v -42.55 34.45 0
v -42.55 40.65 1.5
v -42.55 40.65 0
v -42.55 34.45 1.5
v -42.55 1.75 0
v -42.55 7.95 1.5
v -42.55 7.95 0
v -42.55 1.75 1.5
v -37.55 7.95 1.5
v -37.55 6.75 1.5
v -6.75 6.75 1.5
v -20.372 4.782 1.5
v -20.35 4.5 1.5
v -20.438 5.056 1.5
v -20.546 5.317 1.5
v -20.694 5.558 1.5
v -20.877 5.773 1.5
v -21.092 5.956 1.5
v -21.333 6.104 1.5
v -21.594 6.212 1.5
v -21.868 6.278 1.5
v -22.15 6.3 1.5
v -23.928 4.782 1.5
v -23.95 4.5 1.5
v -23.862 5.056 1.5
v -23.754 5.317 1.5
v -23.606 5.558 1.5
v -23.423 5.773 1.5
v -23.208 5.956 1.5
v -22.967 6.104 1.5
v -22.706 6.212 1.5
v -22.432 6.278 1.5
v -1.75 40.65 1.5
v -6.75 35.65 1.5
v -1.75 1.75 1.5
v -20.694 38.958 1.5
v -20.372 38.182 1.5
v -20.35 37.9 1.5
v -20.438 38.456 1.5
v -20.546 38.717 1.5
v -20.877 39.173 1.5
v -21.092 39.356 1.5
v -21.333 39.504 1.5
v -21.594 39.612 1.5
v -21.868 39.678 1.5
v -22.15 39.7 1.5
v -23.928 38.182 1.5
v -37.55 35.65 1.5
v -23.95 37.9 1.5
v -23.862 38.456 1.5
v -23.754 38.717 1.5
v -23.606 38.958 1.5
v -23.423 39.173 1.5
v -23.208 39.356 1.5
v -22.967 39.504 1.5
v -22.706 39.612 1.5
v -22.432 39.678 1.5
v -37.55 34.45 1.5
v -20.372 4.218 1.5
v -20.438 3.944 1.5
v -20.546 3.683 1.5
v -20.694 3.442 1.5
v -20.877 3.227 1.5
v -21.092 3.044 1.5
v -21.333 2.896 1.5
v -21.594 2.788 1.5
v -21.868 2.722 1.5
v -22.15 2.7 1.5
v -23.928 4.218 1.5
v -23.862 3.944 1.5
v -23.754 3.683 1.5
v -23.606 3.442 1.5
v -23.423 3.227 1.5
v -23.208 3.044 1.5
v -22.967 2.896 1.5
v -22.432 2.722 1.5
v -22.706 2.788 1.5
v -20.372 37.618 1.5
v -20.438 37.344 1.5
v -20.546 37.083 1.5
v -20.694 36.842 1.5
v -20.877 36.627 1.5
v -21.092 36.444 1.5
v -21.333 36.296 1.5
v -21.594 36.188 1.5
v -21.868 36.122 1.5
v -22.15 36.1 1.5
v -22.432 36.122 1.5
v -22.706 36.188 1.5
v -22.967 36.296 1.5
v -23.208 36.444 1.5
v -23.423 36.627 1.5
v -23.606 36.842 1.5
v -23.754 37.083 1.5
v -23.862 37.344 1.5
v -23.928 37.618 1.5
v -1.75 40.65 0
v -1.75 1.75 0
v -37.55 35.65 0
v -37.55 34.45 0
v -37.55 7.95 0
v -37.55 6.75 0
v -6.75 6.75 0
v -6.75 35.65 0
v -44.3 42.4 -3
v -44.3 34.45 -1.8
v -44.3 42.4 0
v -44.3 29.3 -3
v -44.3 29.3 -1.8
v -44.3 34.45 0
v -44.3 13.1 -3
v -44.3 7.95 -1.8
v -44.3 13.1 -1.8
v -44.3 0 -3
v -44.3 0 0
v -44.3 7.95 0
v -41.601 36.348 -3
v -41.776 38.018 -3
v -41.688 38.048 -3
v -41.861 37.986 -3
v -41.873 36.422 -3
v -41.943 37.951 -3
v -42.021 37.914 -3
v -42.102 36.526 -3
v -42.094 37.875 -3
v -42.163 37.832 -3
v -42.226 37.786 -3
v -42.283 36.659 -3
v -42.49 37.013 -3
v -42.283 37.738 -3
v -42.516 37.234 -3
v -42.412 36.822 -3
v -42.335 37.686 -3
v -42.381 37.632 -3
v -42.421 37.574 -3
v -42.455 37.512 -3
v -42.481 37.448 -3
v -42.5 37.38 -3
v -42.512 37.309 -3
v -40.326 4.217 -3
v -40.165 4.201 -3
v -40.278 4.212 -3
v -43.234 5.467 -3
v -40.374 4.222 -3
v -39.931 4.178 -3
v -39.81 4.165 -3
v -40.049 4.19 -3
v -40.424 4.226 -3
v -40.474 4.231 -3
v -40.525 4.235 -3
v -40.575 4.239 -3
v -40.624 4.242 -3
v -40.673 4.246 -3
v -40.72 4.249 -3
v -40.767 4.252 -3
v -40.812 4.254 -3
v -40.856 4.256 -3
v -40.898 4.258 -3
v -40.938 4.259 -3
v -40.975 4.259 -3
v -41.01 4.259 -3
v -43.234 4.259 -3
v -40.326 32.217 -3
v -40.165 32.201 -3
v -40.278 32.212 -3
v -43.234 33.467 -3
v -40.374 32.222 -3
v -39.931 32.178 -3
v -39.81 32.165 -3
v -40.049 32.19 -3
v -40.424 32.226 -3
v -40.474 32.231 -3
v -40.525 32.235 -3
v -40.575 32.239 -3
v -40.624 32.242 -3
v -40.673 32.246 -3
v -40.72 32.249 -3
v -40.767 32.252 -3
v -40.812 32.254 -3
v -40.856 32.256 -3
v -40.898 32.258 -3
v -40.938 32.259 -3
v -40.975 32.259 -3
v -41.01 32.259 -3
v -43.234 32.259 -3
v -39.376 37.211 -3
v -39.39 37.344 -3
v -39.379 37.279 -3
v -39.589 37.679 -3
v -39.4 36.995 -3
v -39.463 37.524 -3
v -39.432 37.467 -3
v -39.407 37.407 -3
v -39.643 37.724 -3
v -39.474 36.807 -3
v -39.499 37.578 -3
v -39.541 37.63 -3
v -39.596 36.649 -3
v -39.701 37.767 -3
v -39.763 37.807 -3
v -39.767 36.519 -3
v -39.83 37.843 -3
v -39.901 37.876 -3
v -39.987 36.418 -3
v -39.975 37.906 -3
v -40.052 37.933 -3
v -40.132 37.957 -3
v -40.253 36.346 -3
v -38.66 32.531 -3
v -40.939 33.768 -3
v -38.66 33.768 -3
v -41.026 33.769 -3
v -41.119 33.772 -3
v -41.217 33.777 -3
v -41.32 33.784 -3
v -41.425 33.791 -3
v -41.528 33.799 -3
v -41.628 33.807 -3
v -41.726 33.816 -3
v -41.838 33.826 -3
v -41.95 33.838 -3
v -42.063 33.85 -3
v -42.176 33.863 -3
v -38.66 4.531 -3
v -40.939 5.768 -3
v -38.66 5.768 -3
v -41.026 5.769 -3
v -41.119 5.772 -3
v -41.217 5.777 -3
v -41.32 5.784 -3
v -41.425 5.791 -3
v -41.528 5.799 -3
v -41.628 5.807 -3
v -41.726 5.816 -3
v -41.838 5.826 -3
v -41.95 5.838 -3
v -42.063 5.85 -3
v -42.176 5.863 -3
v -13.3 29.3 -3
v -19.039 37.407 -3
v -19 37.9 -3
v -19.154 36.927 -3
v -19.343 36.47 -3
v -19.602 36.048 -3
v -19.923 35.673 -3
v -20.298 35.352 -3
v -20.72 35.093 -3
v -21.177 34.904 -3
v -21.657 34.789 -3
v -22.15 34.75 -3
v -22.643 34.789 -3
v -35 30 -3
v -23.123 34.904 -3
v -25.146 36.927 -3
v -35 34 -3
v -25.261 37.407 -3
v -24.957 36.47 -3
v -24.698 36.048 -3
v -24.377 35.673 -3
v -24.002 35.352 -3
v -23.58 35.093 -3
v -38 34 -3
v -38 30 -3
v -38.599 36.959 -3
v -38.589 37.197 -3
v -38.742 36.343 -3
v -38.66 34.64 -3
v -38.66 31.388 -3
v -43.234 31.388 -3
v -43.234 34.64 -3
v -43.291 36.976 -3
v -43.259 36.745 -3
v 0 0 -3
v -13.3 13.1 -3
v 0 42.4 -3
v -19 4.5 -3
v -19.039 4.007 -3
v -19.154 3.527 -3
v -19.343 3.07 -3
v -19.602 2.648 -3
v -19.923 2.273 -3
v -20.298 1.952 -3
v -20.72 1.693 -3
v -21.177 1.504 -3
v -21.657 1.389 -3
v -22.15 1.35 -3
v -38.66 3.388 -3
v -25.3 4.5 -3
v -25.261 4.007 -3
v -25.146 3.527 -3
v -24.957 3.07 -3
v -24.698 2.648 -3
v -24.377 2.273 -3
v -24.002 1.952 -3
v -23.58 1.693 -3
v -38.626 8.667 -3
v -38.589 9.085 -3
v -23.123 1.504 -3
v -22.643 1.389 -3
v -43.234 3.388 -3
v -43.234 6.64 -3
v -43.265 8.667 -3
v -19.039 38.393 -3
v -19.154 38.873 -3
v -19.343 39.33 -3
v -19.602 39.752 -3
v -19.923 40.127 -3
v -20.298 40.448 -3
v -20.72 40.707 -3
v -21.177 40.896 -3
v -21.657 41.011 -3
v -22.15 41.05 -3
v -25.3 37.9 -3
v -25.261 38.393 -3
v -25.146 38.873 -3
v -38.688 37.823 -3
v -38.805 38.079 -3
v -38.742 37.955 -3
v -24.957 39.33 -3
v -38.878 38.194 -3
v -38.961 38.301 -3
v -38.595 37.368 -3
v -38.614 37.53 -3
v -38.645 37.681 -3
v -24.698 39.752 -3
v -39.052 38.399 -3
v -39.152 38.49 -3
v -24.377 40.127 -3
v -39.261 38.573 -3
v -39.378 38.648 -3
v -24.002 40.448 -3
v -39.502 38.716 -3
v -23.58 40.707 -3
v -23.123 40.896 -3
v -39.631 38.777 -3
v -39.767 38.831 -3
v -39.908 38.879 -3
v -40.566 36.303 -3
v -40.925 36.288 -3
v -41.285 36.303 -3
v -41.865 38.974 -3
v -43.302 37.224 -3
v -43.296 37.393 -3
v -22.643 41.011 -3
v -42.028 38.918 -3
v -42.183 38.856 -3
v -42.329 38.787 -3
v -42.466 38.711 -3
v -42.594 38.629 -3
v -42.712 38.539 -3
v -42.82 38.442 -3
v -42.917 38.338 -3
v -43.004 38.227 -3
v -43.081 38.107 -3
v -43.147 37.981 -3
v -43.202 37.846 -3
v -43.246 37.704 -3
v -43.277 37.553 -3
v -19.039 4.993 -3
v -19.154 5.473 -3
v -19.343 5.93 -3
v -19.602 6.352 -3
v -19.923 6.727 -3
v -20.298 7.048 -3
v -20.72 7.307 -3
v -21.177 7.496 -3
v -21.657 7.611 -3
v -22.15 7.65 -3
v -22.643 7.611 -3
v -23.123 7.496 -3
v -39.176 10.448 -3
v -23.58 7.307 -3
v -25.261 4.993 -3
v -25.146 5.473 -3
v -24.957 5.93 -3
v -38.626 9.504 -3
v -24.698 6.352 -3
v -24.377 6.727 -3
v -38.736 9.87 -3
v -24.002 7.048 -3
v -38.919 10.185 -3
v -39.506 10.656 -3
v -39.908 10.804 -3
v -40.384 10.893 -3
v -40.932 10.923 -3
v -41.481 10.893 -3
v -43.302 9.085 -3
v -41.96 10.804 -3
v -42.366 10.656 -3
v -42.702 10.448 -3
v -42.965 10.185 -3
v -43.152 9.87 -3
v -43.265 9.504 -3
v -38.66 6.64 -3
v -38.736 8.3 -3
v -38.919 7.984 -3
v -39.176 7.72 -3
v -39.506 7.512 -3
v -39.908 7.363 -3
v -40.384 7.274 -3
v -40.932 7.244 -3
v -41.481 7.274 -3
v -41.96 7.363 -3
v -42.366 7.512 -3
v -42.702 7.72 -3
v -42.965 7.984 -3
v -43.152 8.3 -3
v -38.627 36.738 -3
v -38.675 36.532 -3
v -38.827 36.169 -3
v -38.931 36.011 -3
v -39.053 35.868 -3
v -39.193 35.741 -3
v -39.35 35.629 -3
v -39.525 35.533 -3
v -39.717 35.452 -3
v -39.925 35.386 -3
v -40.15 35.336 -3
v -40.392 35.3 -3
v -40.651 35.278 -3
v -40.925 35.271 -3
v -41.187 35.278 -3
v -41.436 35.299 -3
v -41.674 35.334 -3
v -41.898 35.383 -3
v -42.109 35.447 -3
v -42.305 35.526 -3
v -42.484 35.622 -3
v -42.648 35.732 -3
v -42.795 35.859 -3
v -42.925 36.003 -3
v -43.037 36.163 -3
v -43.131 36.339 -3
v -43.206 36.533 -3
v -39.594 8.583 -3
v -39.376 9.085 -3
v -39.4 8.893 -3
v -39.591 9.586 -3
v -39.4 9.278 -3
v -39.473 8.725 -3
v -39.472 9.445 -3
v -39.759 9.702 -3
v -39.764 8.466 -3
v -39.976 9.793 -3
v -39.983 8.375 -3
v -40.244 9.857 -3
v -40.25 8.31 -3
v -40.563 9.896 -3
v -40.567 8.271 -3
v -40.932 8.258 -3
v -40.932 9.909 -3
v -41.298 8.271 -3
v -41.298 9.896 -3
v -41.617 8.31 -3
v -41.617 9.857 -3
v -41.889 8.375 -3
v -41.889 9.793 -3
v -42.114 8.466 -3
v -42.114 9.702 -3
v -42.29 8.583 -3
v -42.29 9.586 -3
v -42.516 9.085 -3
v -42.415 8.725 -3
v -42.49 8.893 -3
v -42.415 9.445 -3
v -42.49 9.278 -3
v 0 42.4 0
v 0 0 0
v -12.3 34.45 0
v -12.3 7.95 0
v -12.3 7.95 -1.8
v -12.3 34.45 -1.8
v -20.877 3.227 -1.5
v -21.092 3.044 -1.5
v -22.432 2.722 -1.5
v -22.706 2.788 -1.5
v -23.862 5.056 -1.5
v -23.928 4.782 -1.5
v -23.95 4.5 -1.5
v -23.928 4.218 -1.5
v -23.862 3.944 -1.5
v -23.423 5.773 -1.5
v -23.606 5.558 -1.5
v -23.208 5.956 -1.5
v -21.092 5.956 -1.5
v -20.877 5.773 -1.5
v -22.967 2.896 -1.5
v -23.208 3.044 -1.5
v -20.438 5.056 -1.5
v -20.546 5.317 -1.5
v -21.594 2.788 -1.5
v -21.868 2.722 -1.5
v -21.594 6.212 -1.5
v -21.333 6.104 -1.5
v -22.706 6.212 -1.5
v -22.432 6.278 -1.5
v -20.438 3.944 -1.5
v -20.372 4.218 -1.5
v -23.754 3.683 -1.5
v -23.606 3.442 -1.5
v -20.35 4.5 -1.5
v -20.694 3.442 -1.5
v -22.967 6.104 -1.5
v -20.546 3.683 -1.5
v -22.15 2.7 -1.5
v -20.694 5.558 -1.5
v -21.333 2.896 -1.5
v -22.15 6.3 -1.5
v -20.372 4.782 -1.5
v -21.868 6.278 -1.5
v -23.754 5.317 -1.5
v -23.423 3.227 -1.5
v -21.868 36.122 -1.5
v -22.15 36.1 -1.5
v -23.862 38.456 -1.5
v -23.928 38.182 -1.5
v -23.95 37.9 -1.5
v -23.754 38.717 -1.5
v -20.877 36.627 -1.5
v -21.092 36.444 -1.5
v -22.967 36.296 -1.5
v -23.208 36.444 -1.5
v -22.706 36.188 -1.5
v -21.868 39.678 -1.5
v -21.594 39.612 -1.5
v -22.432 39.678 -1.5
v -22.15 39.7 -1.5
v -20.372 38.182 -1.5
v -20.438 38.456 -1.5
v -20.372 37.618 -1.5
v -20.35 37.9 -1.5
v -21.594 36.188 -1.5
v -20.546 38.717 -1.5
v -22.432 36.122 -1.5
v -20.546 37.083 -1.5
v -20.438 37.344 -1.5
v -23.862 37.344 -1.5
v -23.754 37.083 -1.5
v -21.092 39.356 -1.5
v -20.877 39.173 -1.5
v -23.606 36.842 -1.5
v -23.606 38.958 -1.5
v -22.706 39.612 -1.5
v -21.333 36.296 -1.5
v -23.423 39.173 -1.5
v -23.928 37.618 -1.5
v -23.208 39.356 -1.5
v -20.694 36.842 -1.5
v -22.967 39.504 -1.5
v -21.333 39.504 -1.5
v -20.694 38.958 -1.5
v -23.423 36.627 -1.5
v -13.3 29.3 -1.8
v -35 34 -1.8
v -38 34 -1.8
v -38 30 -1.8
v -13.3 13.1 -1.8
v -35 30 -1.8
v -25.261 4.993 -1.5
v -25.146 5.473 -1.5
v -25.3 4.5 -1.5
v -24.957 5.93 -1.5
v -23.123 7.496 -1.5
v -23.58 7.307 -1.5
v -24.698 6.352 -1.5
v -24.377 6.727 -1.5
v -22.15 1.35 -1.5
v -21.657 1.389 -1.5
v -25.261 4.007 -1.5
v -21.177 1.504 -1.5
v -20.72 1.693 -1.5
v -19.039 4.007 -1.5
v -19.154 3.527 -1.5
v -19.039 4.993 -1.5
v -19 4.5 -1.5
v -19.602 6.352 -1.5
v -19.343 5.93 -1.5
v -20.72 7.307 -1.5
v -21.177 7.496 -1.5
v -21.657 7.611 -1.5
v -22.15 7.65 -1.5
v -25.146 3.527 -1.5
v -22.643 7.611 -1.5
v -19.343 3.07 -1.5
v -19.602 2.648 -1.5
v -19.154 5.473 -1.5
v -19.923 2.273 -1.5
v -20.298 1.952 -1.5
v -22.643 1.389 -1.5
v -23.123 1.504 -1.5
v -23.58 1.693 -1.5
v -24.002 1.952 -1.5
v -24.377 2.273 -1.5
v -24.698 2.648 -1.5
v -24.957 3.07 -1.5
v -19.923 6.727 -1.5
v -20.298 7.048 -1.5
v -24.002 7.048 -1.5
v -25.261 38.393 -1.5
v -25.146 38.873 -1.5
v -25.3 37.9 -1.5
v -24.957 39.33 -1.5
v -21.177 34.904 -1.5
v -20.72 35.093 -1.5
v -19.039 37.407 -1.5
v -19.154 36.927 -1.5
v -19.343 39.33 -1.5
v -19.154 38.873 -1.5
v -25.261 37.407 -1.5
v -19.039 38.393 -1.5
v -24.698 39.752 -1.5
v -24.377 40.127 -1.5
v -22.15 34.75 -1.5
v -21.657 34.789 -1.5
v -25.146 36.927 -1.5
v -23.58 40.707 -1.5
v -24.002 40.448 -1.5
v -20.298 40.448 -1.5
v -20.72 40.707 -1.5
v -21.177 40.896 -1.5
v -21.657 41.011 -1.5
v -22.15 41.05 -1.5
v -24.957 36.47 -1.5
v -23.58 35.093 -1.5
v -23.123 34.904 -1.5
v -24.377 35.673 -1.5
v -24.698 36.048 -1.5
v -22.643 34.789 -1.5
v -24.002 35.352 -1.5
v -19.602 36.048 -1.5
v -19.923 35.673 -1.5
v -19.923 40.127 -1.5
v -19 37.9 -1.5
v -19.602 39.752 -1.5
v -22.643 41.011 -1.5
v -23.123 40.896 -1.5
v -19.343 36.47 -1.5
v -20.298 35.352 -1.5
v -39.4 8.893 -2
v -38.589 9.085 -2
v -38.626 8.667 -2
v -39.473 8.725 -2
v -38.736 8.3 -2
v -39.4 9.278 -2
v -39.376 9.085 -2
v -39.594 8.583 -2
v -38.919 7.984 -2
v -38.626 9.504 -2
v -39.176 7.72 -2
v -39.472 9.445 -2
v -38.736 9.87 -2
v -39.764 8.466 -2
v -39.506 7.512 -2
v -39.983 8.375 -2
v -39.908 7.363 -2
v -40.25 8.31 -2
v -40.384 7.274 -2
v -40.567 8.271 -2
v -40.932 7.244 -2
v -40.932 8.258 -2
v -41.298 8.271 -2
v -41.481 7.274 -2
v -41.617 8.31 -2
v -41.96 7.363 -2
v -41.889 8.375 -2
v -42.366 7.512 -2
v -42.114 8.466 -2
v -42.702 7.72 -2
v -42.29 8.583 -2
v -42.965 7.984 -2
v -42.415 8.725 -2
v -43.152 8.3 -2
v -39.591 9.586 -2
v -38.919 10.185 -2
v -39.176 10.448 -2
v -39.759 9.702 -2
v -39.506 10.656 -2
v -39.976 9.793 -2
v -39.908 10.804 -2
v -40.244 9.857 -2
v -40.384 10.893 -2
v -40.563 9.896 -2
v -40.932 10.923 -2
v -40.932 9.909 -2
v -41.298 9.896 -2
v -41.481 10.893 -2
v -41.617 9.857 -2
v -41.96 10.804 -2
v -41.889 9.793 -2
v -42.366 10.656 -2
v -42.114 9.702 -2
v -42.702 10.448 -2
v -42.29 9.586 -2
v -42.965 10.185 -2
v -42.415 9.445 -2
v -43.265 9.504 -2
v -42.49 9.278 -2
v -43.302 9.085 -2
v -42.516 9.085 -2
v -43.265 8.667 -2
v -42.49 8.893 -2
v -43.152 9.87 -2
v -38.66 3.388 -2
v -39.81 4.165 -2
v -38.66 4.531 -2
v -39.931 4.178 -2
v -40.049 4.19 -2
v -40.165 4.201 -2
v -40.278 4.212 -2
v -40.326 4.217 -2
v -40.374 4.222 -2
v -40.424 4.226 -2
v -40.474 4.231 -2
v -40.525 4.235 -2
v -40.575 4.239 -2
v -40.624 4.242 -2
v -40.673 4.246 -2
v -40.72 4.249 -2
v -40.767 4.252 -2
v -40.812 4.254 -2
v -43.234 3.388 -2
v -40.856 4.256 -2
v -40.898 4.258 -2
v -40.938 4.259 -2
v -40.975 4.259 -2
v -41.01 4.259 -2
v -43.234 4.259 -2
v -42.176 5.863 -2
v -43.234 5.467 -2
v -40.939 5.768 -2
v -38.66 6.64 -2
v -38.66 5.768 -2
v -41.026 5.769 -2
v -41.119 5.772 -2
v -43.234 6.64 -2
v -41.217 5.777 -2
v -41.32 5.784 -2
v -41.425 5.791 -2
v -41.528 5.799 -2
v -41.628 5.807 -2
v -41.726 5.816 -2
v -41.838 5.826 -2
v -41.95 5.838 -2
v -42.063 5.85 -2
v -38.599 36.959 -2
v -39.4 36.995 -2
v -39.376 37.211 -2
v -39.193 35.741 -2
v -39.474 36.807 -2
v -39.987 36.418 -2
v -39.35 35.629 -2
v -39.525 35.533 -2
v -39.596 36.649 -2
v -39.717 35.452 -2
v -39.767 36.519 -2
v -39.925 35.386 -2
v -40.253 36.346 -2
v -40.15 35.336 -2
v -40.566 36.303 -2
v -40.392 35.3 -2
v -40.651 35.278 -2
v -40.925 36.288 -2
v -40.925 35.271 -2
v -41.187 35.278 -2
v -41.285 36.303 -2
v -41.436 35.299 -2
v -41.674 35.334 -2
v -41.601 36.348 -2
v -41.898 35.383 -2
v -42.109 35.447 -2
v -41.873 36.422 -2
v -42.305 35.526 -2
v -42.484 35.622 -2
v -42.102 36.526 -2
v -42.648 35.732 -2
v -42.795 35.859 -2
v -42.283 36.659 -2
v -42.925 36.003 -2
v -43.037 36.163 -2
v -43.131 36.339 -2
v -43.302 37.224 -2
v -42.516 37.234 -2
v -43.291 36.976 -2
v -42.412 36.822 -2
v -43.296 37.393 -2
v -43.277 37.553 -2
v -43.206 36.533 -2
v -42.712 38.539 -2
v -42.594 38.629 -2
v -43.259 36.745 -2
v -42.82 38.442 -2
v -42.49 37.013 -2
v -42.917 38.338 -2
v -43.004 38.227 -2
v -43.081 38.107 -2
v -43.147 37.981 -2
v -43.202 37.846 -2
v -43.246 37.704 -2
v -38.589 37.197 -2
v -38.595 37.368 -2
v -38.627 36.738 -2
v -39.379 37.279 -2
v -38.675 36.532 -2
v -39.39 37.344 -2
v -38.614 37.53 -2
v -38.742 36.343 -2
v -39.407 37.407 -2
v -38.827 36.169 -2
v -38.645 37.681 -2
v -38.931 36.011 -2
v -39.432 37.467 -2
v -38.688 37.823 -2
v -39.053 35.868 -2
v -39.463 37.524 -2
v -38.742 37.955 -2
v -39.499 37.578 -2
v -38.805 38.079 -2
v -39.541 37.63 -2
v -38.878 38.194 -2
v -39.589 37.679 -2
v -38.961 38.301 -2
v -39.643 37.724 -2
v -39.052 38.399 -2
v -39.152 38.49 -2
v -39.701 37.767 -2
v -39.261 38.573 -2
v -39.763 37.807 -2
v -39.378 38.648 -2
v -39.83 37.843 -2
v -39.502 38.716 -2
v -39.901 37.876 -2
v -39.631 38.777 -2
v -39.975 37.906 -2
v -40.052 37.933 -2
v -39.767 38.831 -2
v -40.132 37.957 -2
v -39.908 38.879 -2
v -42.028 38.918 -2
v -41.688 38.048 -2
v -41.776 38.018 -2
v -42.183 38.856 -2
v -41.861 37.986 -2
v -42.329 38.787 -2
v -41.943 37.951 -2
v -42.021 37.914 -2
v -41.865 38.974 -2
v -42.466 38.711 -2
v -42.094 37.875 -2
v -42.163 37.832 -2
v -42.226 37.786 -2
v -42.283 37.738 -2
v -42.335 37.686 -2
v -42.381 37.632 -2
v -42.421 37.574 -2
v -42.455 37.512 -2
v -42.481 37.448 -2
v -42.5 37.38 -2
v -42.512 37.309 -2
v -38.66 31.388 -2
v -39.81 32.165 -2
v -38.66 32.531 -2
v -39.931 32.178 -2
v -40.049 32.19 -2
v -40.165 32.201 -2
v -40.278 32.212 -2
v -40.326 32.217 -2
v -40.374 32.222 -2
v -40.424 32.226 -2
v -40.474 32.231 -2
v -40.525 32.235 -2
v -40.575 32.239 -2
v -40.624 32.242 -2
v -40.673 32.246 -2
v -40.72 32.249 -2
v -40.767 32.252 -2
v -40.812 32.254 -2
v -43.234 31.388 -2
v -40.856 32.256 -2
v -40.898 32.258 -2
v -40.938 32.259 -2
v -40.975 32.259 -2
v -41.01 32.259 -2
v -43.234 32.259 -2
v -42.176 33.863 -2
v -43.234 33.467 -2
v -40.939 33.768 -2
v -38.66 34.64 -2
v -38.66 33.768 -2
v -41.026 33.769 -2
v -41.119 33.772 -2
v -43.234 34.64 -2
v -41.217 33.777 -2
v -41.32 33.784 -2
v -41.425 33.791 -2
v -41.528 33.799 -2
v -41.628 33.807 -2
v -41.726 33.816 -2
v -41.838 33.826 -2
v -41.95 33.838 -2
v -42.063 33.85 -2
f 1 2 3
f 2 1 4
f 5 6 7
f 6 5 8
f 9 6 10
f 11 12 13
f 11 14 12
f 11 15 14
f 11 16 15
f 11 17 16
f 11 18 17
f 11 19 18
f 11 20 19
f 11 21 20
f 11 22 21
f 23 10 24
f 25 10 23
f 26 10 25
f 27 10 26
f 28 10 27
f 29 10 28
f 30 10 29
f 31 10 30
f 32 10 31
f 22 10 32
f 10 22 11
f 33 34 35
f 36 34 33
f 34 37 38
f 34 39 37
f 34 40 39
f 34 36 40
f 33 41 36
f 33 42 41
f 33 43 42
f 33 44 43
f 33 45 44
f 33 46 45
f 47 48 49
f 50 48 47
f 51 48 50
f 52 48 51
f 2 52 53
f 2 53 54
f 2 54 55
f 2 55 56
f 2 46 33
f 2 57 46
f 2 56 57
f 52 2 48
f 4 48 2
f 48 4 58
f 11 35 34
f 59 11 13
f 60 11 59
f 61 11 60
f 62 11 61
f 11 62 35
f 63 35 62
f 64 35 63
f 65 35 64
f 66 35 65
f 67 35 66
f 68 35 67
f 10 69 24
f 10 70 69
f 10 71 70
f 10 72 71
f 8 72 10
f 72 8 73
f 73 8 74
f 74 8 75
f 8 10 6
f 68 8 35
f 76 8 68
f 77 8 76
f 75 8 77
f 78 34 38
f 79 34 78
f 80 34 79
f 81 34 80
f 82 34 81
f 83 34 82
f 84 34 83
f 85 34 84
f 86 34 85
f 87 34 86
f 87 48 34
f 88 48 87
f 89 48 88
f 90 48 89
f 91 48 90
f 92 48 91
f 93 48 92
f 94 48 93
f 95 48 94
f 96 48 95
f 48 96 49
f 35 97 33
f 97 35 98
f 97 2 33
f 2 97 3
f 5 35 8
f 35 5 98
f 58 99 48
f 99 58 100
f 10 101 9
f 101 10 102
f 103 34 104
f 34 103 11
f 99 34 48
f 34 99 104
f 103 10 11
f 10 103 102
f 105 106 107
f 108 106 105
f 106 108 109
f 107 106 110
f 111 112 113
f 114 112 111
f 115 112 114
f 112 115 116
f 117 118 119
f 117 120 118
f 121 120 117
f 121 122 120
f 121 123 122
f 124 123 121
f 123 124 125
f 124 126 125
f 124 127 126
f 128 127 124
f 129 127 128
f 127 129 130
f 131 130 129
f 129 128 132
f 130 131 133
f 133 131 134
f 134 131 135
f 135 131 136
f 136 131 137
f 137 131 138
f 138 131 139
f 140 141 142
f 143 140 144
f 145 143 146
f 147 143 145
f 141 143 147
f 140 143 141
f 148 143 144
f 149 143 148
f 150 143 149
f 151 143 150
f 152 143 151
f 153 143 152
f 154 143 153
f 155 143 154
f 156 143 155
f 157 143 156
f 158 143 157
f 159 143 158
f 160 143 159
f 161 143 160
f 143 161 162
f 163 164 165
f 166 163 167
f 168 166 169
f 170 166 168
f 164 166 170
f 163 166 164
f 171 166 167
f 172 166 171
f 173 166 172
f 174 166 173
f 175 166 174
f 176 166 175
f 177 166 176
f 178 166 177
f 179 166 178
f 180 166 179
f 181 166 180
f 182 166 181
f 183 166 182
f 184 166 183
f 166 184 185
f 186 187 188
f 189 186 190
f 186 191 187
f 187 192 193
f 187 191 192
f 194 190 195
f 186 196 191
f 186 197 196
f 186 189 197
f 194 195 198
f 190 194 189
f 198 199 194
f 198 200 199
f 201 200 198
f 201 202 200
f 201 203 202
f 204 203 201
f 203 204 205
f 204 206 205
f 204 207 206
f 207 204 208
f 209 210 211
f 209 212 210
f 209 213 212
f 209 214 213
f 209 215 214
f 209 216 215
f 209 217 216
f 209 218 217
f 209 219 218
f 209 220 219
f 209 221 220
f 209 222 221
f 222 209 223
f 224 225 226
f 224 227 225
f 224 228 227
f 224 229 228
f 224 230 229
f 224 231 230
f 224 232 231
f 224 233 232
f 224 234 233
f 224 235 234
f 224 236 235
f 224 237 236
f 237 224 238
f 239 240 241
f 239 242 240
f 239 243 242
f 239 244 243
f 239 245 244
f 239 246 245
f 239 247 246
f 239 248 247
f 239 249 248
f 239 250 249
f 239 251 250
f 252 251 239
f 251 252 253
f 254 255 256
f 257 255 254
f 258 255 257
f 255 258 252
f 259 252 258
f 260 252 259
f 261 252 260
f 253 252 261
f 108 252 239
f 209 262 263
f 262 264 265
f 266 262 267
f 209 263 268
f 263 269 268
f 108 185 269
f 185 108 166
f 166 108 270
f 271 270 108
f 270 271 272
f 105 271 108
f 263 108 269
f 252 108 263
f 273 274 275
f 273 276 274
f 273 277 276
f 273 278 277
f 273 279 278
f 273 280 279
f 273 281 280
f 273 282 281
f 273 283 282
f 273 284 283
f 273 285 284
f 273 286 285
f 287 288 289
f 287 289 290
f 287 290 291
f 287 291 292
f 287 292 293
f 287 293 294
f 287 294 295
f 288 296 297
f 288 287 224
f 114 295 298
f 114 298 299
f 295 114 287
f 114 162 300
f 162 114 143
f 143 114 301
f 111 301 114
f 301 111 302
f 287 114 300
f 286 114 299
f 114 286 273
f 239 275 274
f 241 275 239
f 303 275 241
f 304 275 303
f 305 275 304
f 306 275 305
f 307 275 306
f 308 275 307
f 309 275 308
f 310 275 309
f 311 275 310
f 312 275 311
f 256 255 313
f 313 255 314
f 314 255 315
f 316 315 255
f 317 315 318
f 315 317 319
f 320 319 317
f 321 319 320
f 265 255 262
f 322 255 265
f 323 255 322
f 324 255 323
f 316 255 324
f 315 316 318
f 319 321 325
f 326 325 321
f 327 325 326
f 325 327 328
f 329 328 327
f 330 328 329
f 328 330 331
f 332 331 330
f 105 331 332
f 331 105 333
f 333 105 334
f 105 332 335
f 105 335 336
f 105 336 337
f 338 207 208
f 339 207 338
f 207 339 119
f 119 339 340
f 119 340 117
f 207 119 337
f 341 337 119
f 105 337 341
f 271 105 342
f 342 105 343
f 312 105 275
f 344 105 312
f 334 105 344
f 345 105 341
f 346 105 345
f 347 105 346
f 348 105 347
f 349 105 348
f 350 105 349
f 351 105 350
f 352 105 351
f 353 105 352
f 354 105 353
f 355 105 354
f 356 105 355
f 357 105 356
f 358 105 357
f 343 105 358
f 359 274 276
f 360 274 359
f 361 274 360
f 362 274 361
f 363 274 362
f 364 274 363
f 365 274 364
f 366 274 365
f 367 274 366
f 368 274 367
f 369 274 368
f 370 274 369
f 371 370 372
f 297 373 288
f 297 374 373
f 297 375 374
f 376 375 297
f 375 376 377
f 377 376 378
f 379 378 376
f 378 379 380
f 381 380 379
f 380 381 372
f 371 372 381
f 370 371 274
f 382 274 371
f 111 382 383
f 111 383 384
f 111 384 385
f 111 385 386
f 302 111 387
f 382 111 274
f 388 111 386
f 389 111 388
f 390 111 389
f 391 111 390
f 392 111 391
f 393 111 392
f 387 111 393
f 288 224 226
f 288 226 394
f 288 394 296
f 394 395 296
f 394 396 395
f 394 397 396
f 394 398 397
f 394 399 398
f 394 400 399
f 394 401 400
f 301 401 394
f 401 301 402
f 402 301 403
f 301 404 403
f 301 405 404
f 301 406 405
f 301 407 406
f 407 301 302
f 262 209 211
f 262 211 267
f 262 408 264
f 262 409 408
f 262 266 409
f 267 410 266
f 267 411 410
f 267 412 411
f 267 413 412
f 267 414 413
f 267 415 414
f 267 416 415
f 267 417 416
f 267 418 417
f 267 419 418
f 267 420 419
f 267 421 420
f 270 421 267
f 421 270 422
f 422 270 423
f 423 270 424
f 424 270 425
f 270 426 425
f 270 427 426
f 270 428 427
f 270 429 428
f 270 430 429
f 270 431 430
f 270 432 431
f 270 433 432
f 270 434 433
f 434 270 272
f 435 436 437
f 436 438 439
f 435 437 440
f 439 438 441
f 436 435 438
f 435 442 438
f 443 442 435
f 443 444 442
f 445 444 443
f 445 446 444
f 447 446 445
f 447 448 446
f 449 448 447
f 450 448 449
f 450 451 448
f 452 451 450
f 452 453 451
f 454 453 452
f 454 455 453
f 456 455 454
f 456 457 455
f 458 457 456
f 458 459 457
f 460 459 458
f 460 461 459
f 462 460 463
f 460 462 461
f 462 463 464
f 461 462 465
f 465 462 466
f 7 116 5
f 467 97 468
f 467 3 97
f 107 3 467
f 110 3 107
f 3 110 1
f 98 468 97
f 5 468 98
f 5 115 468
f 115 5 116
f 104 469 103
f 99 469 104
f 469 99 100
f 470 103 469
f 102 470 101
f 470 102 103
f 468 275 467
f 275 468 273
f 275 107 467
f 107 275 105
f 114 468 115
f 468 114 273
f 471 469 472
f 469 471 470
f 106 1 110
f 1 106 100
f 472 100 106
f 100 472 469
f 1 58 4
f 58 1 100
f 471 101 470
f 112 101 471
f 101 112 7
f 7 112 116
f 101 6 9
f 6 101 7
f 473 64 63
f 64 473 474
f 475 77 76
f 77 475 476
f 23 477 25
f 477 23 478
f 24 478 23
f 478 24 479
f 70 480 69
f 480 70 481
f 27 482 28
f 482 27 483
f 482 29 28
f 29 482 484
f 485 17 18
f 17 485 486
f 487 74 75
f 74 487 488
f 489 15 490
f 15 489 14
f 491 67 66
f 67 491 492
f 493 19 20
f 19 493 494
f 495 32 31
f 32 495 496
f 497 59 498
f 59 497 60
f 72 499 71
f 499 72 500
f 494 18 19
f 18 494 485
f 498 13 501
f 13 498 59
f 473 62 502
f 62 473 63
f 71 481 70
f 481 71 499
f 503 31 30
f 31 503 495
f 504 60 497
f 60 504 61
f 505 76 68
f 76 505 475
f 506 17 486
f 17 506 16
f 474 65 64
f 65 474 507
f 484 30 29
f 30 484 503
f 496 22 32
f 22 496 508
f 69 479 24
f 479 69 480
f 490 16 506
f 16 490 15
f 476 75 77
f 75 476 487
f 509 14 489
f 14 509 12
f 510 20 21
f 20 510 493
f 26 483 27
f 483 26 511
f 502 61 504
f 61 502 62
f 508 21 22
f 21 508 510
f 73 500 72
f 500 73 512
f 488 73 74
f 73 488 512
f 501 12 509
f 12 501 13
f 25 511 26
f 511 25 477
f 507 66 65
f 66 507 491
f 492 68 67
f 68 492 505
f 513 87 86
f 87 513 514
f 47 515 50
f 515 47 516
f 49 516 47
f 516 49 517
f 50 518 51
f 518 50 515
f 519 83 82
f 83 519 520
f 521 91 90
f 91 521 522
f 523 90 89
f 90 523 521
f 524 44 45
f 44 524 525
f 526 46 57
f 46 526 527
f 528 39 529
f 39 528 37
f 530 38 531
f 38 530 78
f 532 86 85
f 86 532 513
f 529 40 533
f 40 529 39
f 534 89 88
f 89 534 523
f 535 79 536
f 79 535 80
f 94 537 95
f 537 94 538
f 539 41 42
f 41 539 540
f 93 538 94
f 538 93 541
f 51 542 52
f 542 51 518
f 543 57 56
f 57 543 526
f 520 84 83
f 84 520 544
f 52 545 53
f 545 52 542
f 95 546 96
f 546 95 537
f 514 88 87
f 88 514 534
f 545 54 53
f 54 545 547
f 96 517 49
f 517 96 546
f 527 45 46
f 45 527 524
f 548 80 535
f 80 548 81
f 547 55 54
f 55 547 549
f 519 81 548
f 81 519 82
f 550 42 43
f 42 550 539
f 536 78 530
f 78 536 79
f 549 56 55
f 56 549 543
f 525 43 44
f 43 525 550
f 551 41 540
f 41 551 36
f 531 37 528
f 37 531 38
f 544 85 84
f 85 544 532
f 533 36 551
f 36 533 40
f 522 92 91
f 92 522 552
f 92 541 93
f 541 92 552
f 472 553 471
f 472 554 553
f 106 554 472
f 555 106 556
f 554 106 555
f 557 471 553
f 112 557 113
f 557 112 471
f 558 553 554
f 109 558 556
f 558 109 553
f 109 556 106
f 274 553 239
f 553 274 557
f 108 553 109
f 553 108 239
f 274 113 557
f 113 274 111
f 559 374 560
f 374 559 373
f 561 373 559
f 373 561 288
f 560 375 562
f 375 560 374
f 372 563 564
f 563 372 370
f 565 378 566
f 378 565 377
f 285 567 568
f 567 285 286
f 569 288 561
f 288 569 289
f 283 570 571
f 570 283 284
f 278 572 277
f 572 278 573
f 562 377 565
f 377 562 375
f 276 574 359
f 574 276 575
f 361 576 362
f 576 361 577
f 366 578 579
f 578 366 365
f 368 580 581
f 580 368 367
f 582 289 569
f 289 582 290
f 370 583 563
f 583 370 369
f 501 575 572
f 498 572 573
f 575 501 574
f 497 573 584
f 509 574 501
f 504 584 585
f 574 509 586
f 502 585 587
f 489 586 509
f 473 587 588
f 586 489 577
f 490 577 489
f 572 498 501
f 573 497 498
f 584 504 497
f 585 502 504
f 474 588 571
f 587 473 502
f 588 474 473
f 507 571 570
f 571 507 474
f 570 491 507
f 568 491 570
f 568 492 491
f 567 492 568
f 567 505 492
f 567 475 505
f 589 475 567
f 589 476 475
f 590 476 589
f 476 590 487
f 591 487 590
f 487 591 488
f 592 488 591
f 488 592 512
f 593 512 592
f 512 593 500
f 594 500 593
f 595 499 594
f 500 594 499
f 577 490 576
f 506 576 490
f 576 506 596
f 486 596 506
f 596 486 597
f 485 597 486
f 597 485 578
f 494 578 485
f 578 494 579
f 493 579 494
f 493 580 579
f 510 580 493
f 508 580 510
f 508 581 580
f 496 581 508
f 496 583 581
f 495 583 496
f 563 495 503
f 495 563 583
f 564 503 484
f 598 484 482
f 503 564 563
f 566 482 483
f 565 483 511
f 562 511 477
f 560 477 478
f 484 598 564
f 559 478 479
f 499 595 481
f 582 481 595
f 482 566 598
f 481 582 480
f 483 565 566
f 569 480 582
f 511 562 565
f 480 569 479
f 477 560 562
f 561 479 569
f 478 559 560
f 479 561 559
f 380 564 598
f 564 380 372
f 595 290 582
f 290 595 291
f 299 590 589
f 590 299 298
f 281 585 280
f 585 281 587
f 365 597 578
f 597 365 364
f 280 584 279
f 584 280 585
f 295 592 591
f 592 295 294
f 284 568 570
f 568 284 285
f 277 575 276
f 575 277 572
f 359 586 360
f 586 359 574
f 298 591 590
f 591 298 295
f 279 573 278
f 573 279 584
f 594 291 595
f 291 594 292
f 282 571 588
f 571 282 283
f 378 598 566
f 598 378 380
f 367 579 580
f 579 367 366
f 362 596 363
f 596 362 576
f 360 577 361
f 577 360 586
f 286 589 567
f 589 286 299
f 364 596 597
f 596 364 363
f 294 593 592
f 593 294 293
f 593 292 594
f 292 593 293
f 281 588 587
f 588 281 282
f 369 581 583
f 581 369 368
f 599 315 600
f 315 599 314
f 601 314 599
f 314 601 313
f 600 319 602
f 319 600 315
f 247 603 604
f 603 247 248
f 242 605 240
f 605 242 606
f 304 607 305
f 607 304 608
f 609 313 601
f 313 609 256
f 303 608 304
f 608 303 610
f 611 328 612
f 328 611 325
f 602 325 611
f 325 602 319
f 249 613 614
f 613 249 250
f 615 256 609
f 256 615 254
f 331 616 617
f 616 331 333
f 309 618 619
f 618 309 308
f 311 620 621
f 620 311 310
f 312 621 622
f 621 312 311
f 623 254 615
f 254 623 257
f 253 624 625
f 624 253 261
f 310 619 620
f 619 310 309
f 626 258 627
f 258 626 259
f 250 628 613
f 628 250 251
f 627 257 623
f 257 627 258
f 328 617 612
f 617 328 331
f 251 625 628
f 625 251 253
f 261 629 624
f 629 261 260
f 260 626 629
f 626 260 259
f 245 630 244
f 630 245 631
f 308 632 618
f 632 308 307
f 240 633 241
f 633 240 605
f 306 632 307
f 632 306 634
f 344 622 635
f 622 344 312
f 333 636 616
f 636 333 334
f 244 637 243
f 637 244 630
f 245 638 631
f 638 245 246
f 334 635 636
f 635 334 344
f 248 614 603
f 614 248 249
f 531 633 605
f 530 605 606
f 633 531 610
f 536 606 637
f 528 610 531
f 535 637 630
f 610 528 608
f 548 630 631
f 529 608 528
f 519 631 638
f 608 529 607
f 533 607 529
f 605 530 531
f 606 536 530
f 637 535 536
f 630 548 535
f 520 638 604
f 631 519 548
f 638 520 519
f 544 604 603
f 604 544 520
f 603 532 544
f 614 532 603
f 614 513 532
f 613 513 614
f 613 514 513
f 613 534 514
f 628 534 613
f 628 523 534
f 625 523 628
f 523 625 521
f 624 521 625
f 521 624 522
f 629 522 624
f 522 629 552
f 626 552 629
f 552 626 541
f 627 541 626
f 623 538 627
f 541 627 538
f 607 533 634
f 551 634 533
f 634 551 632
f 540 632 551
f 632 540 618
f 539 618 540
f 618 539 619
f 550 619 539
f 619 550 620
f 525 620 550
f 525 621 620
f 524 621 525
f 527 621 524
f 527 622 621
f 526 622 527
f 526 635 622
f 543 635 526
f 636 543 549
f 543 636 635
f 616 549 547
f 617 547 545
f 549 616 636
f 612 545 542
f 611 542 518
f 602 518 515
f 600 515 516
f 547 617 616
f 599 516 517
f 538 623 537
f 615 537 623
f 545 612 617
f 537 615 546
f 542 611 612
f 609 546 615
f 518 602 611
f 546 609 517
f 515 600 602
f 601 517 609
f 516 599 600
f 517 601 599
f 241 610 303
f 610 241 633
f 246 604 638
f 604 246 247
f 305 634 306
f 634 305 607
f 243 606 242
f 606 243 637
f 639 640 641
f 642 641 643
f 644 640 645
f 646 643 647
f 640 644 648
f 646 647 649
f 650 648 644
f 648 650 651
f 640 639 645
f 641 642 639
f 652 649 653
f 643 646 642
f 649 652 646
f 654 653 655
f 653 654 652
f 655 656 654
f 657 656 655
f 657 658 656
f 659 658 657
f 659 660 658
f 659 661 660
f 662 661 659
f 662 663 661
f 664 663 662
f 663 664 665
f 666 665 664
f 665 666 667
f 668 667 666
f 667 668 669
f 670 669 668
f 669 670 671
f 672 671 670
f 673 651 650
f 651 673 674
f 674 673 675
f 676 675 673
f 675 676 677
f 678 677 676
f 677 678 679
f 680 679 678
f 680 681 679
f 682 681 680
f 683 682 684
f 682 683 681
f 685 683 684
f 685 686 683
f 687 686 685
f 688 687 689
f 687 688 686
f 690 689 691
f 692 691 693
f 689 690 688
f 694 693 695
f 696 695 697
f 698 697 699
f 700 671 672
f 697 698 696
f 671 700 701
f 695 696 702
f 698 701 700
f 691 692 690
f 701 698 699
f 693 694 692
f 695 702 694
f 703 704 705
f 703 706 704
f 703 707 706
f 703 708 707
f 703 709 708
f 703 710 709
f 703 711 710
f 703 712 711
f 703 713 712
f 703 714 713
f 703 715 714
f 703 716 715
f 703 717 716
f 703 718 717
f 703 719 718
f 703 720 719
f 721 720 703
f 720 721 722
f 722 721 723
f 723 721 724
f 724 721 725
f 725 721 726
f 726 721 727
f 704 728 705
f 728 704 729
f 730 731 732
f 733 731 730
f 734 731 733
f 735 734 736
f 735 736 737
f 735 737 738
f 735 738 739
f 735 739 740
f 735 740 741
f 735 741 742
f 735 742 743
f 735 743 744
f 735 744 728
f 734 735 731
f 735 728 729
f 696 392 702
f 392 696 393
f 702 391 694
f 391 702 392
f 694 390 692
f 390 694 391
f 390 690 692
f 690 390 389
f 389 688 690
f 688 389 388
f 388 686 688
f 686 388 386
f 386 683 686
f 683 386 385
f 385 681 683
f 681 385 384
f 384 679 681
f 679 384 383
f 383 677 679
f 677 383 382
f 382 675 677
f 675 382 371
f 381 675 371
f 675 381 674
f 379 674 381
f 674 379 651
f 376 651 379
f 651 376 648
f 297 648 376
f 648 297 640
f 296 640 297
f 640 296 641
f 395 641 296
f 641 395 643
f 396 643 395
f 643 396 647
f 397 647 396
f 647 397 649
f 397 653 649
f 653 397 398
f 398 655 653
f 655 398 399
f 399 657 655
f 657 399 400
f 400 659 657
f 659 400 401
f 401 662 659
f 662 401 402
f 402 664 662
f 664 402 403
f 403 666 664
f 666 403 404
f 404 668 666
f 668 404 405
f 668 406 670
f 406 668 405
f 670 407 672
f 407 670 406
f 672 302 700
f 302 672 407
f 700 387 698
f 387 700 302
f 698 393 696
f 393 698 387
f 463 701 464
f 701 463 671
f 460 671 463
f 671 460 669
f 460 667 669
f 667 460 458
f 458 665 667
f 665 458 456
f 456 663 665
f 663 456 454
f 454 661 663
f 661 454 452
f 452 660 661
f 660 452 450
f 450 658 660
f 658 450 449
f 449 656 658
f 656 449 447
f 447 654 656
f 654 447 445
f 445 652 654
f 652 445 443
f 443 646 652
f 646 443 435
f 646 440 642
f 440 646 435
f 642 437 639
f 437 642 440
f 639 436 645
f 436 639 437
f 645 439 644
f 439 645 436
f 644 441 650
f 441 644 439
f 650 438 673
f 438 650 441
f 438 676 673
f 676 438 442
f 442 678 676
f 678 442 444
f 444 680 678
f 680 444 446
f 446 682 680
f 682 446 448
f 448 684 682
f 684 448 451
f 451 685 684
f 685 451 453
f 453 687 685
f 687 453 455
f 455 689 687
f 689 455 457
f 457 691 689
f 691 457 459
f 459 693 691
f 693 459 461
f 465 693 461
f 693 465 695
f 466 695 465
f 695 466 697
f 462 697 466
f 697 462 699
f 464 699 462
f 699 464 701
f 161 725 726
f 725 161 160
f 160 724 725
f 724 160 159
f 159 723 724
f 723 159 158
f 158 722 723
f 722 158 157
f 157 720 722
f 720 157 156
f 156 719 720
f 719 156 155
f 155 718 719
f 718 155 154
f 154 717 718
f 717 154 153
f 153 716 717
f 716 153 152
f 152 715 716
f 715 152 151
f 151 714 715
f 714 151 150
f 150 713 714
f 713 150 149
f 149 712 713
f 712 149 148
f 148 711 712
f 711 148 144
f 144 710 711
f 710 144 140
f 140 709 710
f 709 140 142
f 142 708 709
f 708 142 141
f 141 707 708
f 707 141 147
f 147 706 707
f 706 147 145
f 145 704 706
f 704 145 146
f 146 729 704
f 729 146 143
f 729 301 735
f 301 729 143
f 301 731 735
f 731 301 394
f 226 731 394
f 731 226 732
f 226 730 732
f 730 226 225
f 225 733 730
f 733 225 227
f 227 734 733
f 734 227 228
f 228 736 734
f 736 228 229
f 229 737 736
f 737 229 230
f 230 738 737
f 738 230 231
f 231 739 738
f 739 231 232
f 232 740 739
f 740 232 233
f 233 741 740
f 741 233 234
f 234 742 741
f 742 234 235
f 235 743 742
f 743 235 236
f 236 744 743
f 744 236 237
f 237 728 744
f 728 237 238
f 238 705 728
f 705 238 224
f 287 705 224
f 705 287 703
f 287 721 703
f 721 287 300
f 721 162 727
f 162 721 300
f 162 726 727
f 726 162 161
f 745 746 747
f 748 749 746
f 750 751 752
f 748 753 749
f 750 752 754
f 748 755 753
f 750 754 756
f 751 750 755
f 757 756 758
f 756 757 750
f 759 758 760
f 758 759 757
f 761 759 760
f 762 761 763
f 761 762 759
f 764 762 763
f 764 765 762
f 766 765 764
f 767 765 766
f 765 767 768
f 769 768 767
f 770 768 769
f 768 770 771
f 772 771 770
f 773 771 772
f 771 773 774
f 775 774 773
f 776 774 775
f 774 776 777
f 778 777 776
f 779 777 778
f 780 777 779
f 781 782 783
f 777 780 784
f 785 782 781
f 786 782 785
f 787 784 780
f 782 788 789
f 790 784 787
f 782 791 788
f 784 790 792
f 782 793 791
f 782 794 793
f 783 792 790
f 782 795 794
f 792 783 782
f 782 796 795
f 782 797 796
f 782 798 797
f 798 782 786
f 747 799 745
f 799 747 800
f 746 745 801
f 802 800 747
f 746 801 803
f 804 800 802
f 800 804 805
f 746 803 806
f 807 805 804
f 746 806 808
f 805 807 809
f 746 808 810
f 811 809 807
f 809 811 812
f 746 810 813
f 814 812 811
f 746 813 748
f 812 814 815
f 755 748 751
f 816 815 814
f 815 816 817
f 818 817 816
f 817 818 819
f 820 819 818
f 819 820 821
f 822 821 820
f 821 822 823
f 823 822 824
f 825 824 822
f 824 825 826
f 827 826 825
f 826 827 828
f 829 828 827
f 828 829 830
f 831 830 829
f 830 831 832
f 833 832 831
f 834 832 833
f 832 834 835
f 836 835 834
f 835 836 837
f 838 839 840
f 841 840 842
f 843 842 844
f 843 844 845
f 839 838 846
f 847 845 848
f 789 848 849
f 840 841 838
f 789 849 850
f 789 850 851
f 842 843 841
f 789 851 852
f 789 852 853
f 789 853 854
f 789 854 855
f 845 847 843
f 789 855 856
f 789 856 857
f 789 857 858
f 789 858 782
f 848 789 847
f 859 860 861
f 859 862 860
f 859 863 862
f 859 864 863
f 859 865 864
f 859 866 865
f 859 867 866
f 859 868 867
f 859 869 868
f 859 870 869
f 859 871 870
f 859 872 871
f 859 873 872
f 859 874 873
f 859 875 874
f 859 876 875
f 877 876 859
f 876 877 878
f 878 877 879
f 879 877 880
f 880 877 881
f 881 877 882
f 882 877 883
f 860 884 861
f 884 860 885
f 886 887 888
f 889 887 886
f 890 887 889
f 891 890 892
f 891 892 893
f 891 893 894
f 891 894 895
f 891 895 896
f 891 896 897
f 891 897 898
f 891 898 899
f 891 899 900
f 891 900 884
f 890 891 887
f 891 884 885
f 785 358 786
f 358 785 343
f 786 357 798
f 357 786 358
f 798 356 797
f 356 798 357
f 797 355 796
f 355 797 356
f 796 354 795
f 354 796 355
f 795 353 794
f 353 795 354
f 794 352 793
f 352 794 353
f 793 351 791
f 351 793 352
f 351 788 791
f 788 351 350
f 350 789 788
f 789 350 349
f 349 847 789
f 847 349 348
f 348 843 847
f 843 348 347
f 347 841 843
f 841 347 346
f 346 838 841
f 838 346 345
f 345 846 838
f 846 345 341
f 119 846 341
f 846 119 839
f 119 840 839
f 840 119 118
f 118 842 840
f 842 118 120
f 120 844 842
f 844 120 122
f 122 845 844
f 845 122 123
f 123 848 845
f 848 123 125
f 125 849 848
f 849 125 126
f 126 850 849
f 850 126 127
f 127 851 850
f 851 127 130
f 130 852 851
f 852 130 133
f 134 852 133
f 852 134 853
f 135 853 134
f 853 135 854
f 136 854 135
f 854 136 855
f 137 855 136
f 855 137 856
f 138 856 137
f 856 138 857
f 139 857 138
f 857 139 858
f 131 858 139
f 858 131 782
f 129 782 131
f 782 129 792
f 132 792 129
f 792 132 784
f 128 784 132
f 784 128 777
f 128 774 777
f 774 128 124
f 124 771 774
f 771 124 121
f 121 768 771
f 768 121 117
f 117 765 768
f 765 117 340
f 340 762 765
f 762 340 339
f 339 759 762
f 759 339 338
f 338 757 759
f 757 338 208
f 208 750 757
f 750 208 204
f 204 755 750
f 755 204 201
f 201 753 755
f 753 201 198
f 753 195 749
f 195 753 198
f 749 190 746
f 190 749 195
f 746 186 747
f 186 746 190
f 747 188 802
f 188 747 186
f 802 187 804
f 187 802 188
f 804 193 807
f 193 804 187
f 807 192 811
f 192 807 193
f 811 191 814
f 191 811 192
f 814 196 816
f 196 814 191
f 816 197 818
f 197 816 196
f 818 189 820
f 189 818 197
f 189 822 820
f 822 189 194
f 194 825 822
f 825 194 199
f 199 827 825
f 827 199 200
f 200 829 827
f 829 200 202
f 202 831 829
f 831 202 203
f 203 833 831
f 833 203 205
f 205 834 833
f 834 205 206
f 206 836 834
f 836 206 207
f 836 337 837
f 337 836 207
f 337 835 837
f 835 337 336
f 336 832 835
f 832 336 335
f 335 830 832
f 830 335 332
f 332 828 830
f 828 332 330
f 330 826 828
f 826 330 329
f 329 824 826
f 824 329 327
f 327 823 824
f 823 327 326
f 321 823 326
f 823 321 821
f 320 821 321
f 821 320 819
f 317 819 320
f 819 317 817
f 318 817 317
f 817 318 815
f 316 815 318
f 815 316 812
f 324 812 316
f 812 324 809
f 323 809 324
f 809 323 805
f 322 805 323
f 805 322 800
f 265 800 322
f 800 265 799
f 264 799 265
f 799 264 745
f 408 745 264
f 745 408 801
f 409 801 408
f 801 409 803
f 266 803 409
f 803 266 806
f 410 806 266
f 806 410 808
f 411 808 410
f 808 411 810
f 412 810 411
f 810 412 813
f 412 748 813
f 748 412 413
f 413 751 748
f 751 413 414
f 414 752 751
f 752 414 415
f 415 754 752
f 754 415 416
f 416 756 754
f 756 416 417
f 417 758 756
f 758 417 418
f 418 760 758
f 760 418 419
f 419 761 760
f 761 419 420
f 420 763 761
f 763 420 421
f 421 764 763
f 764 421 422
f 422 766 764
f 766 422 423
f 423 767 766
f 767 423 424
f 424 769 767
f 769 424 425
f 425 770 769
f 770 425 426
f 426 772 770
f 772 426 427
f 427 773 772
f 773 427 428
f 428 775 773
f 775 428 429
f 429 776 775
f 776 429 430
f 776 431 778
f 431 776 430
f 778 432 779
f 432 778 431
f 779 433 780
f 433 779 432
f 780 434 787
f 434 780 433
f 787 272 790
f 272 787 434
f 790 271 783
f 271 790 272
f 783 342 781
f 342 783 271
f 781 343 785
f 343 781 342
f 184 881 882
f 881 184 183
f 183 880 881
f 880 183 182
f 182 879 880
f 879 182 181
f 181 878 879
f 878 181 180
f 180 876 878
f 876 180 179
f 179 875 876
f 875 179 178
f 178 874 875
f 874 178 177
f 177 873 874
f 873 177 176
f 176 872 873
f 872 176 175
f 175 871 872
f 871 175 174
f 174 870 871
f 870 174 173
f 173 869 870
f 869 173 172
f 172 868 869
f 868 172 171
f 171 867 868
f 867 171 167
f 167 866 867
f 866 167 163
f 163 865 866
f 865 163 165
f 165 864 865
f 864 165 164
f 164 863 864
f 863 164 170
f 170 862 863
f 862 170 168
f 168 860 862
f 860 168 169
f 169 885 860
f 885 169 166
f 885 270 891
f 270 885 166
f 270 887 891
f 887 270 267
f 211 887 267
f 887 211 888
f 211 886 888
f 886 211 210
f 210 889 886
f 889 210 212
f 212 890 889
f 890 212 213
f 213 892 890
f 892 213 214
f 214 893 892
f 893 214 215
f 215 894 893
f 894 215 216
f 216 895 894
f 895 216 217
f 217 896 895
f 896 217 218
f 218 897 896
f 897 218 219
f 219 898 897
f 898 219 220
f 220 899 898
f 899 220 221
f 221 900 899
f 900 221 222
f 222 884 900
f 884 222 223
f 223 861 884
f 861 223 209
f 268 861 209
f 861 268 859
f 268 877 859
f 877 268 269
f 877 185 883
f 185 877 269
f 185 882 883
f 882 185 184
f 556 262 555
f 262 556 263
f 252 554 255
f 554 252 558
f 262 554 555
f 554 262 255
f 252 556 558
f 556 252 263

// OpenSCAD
/*
modular enclosure for ESP32-S2 style of wemos D1 Mini 
current shell lid is for a style of relay 
MIT License
Copyright 2023 James Dodgen

Permission is hereby granted, free of charge, to any person obtaining a copy of this software and associated documentation files (the “Software”), 
to deal in the Software without restriction, including without limitation the rights to use, copy, modify, merge, publish, distribute, 
sublicense, and/or sell copies of the Software, and to permit persons to whom the Software is furnished to do so, subject to the following conditions:

The above copyright notice and this permission notice shall be included in all copies or substantial portions of the Software.

THE SOFTWARE IS PROVIDED “AS IS”, WITHOUT WARRANTY OF ANY KIND, EXPRESS OR IMPLIED, INCLUDING BUT NOT LIMITED TO THE WARRANTIES OF MERCHANTABILITY, 
FITNESS FOR A PARTICULAR PURPOSE AND NONINFRINGEMENT. IN NO EVENT SHALL THE AUTHORS OR COPYRIGHT HOLDERS BE LIABLE FOR ANY CLAIM, 
DAMAGES OR OTHER LIABILITY, WHETHER IN AN ACTION OF CONTRACT, TORT OR OTHERWISE, ARISING FROM, OUT OF OR IN 
CONNECTION WITH THE SOFTWARE OR THE USE OR OTHER DEALINGS IN THE SOFTWARE.
*/

make_somthing = 2;    // 1 base, 2=lid, 3 buttons

if (make_somthing == 1) {
    make_s2_base();
} else if (make_somthing == 2) {
    make_relay_lid();
} else {
    make_button();
    translate([6,0,0]) 
        make_button(); // two needed
}

Mx_fn = 12; // self tapping 
M3_screw_hole = 3.1; 
M3_clearence_hole = 3.6; 
M3_head_clearence_hole = 6.3;

M2_5_screw_hole = 2.7; 
M2_5_clearence_hole = 3.1; 
M2_5_head_clearence_hole = 6.2;

M2_screw_hole = 2.16; 
M2_clearence_hole = 2.6; 

drill_length = 20;


shell_x = 34.3 + 10;   // adjustments off of S2 D1 Mini
shell_y = 25.4 + 17;
shell_z = 20;
shell_wall_thickness = 1.5;
shell_post_d = 7;



module make_s2_base() {
    difference()
    {
        union()
        {
            make_s2_mini_mount(front_stops=false);
            translate([-(shell_x-s2_x)+shell_wall_thickness,(-(shell_y-s2_y)/2),0])
            {
                shell();
            }
        }
        make_s2_mini_mount_cutout();
    }
}

lid_mount_Loc_1 = [shell_x/2,shell_wall_thickness,shell_z-2];
lid_mount_Loc_2 = [shell_x/2,shell_y-shell_wall_thickness,shell_z-2];

//shell();
module shell()
{
    difference()
    {
        cube([shell_x, shell_y, shell_z]) ;
        translate([shell_wall_thickness, shell_wall_thickness ,shell_wall_thickness])
        {
            cube([shell_x - (shell_wall_thickness*2), shell_y-shell_wall_thickness*2, shell_z]);
        }
        mid_y = shell_y/2;
        make_slot([0,mid_y,3],height=shell_z-5);
        make_slot([0,mid_y+4,3],height=shell_z-5);
        make_slot([0,mid_y-4,3],height=shell_z-5);
        make_slot([0,mid_y+8,3],height=shell_z-5);
        make_slot([0,mid_y-8,3],height=shell_z-5);
        make_slot([0,mid_y-12,3],height=shell_z-5);
        make_slot([0,mid_y+12,3],height=shell_z-5);
        make_slot([0,mid_y-16,3],height=shell_z-5);
        make_slot([0,mid_y+16,3],height=shell_z-5);
        translate([33,0.5,9])
            rotate([90,0,0])
                center_text("R", size=5, extrude=1.2);
        translate([33,shell_y+0.7,9])
            rotate([90,0,0])
                center_text("O", size=5, extrude=1.2);       
        
    }
    lid_mount(lid_mount_Loc_1, rot=0);
    lid_mount(lid_mount_Loc_2, rot=180); 
}

//make_relay_lid();
module make_relay_lid()
{
    hat_x = 32;
    hat_y = 26.5;
    lip_depth = 1.9;
    shrinkage = 0.25;
    lip_width = 5;

    rotate([0,180.0])  // print upside down
    difference()
    {
        union()
        {
            difference()
            {
                union()
                {
                    
                    color("orange") cube([shell_x, shell_y, shell_wall_thickness*2]);
                    difference()
                    {
                        translate([shrinkage+shell_wall_thickness, shrinkage+shell_wall_thickness,-shell_wall_thickness])
                        {
                            slop = (shrinkage+shell_wall_thickness);
                            lip_x = shell_x-slop*2;
                            lip_y = shell_y-slop*2;
                            difference()
                            {
                                cut_out_x = lip_x-lip_width*2;
                                cut_out_y = lip_y-lip_width*2;
                                color("green") cube([lip_x, lip_y, lip_depth]);
                                translate([(lip_x-cut_out_x)/2,(lip_y-cut_out_y)/2,0])
                                    cube([cut_out_x, cut_out_y, lip_depth]);
                            }
                        }
                    }
                }
                translate([shell_x-hat_x,(shell_y - hat_y)/2,-10]) 
                    cube([hat_x, hat_y, 20]);
                lid_mount_clearance_hole(lid_mount_Loc_1, rot=0);
                lid_mount_clearance_hole(lid_mount_Loc_2, rot=180);
            }
            relay_y = 16.2;
            relay_x= 31;
            relay_z = 10;
            difference()
            {
                translate([shell_x-relay_x-2,(shell_y - hat_y-2)/2,shell_wall_thickness+0.3]) 
                    color("purple") cube([relay_x+2,hat_y+2,shell_wall_thickness-0.3]);
                translate([shell_x-relay_x,(shell_y - relay_y)/2,0]) 
                    cube([relay_x,relay_y,relay_z]);
            }
        }
        /// cut outs
        translate([0,0,drill_length/2+shell_wall_thickness]) {
            lid_mount_clearance_hole(lid_mount_Loc_1, rot=0,hole_size=M3_head_clearence_hole);
            lid_mount_clearance_hole(lid_mount_Loc_2, rot=180,hole_size=M3_head_clearence_hole); 
        }
        translate([41,7,2])
            rotate([0,0,90])
                center_text("NO", size=5, extrude=2);  
        translate([41,35,2])
            rotate([0,0,90])
                center_text("NC", size=5, extrude=1.2);  
        // LED cutout
        translate([35,30,-5])
                cube([3,4,20]);
    }
}

module lid_mount(xyz,  width=6, height=8, rot=0) {
    
    echo ("rotate", rot);
    if (rot == 0) { 
        translate([xyz.x+width/2, xyz.y, xyz.z])
            rotate([0,180,rot])
                raw_lid_mount(width=6, height=8);
    } else if ((rot == -90) || (rot == 270 )) {
        translate([xyz.x, xyz.y-width/2, xyz.z])
            rotate([0,180,rot])
                raw_lid_mount(width=6, height=8);
    } else if (rot == 90) {
        translate([xyz.x, xyz.y+width/2, xyz.z])
            rotate([0,180,rot])
                raw_lid_mount(width=6, height=8);
    } else if (rot == 180) {
        translate([xyz.x-width/2, xyz.y, xyz.z])
            rotate([0,180,rot])
                raw_lid_mount(width=6, height=8);
    }
}

//lid_mount([10,10,-2], rot=180); 
//lid_mount_clearance_hole([10,10,-2], rot=180); 
module lid_mount_clearance_hole(xyz,  width=6, height=8, rot=0, hole_size=M3_clearence_hole) {
 
    echo ("rotate", rot);
    if (rot == 0) { 
        translate([xyz.x, xyz.y+width/2, -drill_length/2])
           cylinder(h=drill_length, d=hole_size, $fn=40);
    } else if ((rot == -90) || (rot == 270 )) {
        translate([xyz.x+width/2, xyz.y, -drill_length/2])
            cylinder(h=drill_length, d=hole_size, $fn=40);
    } else if (rot == 90) {
        translate([xyz.x-width/2, xyz.y, -drill_length/2])
            cylinder(h=drill_length, d=hole_size, $fn=40);
    } else if (rot == 180) {
        translate([xyz.x, xyz.y-width/2, -drill_length/2])
            cylinder(h=drill_length, d=hole_size, $fn=40);   
    }
}

//raw_lid_mount();
module raw_lid_mount(width=6, height=8) {
    raw_height =20;
    //screw_depth= height*0.75;
    difference() 
    { 
        cube([width, width,raw_height]);			
        // chop off at 45 
        rotate([-45,0,0]) 
            translate([0,-50,height])
                cube([width, 100, raw_height*2]);		
        // screw hole
        translate([width/2, width/2,-2]) 
            cylinder(h=raw_height, d=M3_screw_hole, $fn=Mx_fn);                  
        translate([width/2,width/2,-2]) 
            fillet(180,width/2, raw_height+2, $fn=30);
        translate([0,width/2,-2]) 
                fillet(-90,width/2, raw_height+2, $fn=30);
    }                   
}

*difference() {
    make_s2_mini_mount(button_guides=false);
    make_s2_mini_mount_cutout();
    //translate([10,-50,0]) cube([100,100,100]);
}

/* 
START Wemos S2 Mini mount code
*/
s2_y=25.4;
s2_x=34.3;
s2_thickness=4;

total_height = s2_thickness+3;
usb_c_hole_width = 14;
usb_c_hole_height = 9;

hole_offset_x = 3; 
hole1_offset_y = 2.5;
hole2_offset_y= hole1_offset_y+20.4;  

hole1_loc = [hole_offset_x, hole1_offset_y,0];
hole2_loc = [hole_offset_x, hole2_offset_y,0];
post_d = M2_screw_hole+1.5;
button_hole_d = 4;
module make_s2_mini_mount(button_guides=true, front_stops=true)
{
    
    suport_x = s2_x - post_d/2;
    suport_post1_loc = [suport_x, hole1_offset_y+1, 0];
    suport_post2_loc = [suport_x, hole2_offset_y, 0];
    
    translate([-1,-1,0]) cube([s2_x+2,s2_y+2,s2_thickness]);
    if (button_guides == true) {
        translate([s2_x-8,-4.5,0]) 
            cube([8, 2, 13]);
        translate([s2_x-8,s2_y+3,0]) 
            cube([8, 2, 13]);
    }
    post(hole1_loc, total_height, post_d);
    post(hole2_loc, total_height, post_d);
    post(suport_post1_loc, total_height, post_d);
    post(suport_post2_loc, total_height, post_d);

    // side supports
    translate([-2.25,-2.2,0]) cube([28,2,10]);
    translate([-2.25,s2_y+0.2,0]) cube([29,2,10]);

    // end sppports
    translate([-2.3,-0.2,0]) cube([2,5,10]);
    translate([-2.3,s2_y-5+0.2,0]) cube([2,5,10]);
    if (front_stops == true) {
        translate([s2_x+0.5,-0.2,0]) cube([2,5,10]);
        translate([s2_x+0.5,s2_y-5+0.2,0]) cube([2,5,10]);
    }
}

//make_button();
module make_button() 
{
  cylinder(h = 9 , d = button_hole_d*0.8, $fn = 40); 
  cylinder(h = 1 , d = 4.5, $fn = 40); 
}

module make_s2_mini_mount_cutout()
{
    {
        screw_hole(hole1_loc, total_height, M2_screw_hole);
        screw_hole(hole2_loc, total_height, M2_screw_hole);
        antenna_cutout();
        color("purple")
        {
        //base_x = s2_x; // + 10;
        //base_y = s2_y; // + 17;
        //base_z = 20;
        //base_wall_thickness = 1.5;
            
        translate([s2_x+0.5, (s2_y-usb_c_hole_width)/2, s2_thickness+1])
            usb_c_hole();
        
       translate([s2_x-3.9, 0.5, s2_thickness+5]) 
            rotate([90,0.0])
                cylinder(h = 20 , d = button_hole_d, $fn = 40, center=false);
        
       translate([s2_x-3.9, s2_y, s2_thickness+5.2]) 
            rotate([270,0.0])
                cylinder(h = 20, d = button_hole_d, $fn = 40, center=false);
        }
    }
}

module post(loc,height, diameter) {
    translate(loc)
        cylinder(h=height, d=diameter, $fn=30);
}

module screw_hole(loc,height, screw_hole)
{
    translate(loc)
        cylinder(h=height, d=screw_hole, $fn=Mx_fn); 
        // fn=Mx_fn makes it self threading
}
module antenna_cutout()
{
    translate([-1,hole1_offset_y+(post_d/2)+0.7,0])
        cube([7, s2_y-hole1_offset_y-(post_d*2), s2_thickness]);
}

//usb_c_hole();
module usb_c_hole()
{
    cut_out_height = 20; //base_wall_thickness+4;
    translate([-2,usb_c_hole_height/2,usb_c_hole_height/2])
    {
        color("green") 
        rotate([0,90,0])
            cylinder(h = cut_out_height, d = usb_c_hole_height, center=false, $fn = 60);
    }
    translate([-2, usb_c_hole_width-(usb_c_hole_height/2), usb_c_hole_height/2])
    {
        color("orange") 
        rotate([0,90,0])
            cylinder(h = cut_out_height, d = usb_c_hole_height, center=false, $fn = 60);
    }
    filler_block = usb_c_hole_width-usb_c_hole_height-0.2;
    translate([-2,filler_block,0])
        cube ([cut_out_height, filler_block, usb_c_hole_height]);
    
    *translate([0.1,0,0])
        cube ([shell_wall_thickness, usb_c_hole_width, usb_c_hole_height]);
}
/*
END  wemos s2 mini mount */

// service routines

module fillet(rot, r, h) {
    translate([r / 2, r / 2, h/2])
    rotate([0,0,rot]) difference() {
        cube([r + 0.01, r + 0.01, h], center = true);
        translate([r/2, r/2, 0])
            cylinder(r = r, h = h + 1, center = true);
    }
}

//make_slot([0,0,0,]);
//make_slot([0,0,0,], rotate=1);
module make_slot(s, rotate=0, width=1.7, height=10) {
	thickness = 5;

    if (rotate == 1)	
    {
        translate([s.x-width/2, s.y-thickness/2, s.z])
        cube([width, thickness, height]);		
    }
    else
    {
        translate([s.x-thickness/2, s.y, s.z])
        cube([thickness, width, height]);
    }

}

module center_text(text, size, font="Liberation Mono:style=bold", width=0, length=0, extrude=0.6) {
    $fn = 30;
    translate([length, width, 0]) 
        linear_extrude(extrude) 
            text(text, size=size, font=font, halign="center", valign="center");
}
